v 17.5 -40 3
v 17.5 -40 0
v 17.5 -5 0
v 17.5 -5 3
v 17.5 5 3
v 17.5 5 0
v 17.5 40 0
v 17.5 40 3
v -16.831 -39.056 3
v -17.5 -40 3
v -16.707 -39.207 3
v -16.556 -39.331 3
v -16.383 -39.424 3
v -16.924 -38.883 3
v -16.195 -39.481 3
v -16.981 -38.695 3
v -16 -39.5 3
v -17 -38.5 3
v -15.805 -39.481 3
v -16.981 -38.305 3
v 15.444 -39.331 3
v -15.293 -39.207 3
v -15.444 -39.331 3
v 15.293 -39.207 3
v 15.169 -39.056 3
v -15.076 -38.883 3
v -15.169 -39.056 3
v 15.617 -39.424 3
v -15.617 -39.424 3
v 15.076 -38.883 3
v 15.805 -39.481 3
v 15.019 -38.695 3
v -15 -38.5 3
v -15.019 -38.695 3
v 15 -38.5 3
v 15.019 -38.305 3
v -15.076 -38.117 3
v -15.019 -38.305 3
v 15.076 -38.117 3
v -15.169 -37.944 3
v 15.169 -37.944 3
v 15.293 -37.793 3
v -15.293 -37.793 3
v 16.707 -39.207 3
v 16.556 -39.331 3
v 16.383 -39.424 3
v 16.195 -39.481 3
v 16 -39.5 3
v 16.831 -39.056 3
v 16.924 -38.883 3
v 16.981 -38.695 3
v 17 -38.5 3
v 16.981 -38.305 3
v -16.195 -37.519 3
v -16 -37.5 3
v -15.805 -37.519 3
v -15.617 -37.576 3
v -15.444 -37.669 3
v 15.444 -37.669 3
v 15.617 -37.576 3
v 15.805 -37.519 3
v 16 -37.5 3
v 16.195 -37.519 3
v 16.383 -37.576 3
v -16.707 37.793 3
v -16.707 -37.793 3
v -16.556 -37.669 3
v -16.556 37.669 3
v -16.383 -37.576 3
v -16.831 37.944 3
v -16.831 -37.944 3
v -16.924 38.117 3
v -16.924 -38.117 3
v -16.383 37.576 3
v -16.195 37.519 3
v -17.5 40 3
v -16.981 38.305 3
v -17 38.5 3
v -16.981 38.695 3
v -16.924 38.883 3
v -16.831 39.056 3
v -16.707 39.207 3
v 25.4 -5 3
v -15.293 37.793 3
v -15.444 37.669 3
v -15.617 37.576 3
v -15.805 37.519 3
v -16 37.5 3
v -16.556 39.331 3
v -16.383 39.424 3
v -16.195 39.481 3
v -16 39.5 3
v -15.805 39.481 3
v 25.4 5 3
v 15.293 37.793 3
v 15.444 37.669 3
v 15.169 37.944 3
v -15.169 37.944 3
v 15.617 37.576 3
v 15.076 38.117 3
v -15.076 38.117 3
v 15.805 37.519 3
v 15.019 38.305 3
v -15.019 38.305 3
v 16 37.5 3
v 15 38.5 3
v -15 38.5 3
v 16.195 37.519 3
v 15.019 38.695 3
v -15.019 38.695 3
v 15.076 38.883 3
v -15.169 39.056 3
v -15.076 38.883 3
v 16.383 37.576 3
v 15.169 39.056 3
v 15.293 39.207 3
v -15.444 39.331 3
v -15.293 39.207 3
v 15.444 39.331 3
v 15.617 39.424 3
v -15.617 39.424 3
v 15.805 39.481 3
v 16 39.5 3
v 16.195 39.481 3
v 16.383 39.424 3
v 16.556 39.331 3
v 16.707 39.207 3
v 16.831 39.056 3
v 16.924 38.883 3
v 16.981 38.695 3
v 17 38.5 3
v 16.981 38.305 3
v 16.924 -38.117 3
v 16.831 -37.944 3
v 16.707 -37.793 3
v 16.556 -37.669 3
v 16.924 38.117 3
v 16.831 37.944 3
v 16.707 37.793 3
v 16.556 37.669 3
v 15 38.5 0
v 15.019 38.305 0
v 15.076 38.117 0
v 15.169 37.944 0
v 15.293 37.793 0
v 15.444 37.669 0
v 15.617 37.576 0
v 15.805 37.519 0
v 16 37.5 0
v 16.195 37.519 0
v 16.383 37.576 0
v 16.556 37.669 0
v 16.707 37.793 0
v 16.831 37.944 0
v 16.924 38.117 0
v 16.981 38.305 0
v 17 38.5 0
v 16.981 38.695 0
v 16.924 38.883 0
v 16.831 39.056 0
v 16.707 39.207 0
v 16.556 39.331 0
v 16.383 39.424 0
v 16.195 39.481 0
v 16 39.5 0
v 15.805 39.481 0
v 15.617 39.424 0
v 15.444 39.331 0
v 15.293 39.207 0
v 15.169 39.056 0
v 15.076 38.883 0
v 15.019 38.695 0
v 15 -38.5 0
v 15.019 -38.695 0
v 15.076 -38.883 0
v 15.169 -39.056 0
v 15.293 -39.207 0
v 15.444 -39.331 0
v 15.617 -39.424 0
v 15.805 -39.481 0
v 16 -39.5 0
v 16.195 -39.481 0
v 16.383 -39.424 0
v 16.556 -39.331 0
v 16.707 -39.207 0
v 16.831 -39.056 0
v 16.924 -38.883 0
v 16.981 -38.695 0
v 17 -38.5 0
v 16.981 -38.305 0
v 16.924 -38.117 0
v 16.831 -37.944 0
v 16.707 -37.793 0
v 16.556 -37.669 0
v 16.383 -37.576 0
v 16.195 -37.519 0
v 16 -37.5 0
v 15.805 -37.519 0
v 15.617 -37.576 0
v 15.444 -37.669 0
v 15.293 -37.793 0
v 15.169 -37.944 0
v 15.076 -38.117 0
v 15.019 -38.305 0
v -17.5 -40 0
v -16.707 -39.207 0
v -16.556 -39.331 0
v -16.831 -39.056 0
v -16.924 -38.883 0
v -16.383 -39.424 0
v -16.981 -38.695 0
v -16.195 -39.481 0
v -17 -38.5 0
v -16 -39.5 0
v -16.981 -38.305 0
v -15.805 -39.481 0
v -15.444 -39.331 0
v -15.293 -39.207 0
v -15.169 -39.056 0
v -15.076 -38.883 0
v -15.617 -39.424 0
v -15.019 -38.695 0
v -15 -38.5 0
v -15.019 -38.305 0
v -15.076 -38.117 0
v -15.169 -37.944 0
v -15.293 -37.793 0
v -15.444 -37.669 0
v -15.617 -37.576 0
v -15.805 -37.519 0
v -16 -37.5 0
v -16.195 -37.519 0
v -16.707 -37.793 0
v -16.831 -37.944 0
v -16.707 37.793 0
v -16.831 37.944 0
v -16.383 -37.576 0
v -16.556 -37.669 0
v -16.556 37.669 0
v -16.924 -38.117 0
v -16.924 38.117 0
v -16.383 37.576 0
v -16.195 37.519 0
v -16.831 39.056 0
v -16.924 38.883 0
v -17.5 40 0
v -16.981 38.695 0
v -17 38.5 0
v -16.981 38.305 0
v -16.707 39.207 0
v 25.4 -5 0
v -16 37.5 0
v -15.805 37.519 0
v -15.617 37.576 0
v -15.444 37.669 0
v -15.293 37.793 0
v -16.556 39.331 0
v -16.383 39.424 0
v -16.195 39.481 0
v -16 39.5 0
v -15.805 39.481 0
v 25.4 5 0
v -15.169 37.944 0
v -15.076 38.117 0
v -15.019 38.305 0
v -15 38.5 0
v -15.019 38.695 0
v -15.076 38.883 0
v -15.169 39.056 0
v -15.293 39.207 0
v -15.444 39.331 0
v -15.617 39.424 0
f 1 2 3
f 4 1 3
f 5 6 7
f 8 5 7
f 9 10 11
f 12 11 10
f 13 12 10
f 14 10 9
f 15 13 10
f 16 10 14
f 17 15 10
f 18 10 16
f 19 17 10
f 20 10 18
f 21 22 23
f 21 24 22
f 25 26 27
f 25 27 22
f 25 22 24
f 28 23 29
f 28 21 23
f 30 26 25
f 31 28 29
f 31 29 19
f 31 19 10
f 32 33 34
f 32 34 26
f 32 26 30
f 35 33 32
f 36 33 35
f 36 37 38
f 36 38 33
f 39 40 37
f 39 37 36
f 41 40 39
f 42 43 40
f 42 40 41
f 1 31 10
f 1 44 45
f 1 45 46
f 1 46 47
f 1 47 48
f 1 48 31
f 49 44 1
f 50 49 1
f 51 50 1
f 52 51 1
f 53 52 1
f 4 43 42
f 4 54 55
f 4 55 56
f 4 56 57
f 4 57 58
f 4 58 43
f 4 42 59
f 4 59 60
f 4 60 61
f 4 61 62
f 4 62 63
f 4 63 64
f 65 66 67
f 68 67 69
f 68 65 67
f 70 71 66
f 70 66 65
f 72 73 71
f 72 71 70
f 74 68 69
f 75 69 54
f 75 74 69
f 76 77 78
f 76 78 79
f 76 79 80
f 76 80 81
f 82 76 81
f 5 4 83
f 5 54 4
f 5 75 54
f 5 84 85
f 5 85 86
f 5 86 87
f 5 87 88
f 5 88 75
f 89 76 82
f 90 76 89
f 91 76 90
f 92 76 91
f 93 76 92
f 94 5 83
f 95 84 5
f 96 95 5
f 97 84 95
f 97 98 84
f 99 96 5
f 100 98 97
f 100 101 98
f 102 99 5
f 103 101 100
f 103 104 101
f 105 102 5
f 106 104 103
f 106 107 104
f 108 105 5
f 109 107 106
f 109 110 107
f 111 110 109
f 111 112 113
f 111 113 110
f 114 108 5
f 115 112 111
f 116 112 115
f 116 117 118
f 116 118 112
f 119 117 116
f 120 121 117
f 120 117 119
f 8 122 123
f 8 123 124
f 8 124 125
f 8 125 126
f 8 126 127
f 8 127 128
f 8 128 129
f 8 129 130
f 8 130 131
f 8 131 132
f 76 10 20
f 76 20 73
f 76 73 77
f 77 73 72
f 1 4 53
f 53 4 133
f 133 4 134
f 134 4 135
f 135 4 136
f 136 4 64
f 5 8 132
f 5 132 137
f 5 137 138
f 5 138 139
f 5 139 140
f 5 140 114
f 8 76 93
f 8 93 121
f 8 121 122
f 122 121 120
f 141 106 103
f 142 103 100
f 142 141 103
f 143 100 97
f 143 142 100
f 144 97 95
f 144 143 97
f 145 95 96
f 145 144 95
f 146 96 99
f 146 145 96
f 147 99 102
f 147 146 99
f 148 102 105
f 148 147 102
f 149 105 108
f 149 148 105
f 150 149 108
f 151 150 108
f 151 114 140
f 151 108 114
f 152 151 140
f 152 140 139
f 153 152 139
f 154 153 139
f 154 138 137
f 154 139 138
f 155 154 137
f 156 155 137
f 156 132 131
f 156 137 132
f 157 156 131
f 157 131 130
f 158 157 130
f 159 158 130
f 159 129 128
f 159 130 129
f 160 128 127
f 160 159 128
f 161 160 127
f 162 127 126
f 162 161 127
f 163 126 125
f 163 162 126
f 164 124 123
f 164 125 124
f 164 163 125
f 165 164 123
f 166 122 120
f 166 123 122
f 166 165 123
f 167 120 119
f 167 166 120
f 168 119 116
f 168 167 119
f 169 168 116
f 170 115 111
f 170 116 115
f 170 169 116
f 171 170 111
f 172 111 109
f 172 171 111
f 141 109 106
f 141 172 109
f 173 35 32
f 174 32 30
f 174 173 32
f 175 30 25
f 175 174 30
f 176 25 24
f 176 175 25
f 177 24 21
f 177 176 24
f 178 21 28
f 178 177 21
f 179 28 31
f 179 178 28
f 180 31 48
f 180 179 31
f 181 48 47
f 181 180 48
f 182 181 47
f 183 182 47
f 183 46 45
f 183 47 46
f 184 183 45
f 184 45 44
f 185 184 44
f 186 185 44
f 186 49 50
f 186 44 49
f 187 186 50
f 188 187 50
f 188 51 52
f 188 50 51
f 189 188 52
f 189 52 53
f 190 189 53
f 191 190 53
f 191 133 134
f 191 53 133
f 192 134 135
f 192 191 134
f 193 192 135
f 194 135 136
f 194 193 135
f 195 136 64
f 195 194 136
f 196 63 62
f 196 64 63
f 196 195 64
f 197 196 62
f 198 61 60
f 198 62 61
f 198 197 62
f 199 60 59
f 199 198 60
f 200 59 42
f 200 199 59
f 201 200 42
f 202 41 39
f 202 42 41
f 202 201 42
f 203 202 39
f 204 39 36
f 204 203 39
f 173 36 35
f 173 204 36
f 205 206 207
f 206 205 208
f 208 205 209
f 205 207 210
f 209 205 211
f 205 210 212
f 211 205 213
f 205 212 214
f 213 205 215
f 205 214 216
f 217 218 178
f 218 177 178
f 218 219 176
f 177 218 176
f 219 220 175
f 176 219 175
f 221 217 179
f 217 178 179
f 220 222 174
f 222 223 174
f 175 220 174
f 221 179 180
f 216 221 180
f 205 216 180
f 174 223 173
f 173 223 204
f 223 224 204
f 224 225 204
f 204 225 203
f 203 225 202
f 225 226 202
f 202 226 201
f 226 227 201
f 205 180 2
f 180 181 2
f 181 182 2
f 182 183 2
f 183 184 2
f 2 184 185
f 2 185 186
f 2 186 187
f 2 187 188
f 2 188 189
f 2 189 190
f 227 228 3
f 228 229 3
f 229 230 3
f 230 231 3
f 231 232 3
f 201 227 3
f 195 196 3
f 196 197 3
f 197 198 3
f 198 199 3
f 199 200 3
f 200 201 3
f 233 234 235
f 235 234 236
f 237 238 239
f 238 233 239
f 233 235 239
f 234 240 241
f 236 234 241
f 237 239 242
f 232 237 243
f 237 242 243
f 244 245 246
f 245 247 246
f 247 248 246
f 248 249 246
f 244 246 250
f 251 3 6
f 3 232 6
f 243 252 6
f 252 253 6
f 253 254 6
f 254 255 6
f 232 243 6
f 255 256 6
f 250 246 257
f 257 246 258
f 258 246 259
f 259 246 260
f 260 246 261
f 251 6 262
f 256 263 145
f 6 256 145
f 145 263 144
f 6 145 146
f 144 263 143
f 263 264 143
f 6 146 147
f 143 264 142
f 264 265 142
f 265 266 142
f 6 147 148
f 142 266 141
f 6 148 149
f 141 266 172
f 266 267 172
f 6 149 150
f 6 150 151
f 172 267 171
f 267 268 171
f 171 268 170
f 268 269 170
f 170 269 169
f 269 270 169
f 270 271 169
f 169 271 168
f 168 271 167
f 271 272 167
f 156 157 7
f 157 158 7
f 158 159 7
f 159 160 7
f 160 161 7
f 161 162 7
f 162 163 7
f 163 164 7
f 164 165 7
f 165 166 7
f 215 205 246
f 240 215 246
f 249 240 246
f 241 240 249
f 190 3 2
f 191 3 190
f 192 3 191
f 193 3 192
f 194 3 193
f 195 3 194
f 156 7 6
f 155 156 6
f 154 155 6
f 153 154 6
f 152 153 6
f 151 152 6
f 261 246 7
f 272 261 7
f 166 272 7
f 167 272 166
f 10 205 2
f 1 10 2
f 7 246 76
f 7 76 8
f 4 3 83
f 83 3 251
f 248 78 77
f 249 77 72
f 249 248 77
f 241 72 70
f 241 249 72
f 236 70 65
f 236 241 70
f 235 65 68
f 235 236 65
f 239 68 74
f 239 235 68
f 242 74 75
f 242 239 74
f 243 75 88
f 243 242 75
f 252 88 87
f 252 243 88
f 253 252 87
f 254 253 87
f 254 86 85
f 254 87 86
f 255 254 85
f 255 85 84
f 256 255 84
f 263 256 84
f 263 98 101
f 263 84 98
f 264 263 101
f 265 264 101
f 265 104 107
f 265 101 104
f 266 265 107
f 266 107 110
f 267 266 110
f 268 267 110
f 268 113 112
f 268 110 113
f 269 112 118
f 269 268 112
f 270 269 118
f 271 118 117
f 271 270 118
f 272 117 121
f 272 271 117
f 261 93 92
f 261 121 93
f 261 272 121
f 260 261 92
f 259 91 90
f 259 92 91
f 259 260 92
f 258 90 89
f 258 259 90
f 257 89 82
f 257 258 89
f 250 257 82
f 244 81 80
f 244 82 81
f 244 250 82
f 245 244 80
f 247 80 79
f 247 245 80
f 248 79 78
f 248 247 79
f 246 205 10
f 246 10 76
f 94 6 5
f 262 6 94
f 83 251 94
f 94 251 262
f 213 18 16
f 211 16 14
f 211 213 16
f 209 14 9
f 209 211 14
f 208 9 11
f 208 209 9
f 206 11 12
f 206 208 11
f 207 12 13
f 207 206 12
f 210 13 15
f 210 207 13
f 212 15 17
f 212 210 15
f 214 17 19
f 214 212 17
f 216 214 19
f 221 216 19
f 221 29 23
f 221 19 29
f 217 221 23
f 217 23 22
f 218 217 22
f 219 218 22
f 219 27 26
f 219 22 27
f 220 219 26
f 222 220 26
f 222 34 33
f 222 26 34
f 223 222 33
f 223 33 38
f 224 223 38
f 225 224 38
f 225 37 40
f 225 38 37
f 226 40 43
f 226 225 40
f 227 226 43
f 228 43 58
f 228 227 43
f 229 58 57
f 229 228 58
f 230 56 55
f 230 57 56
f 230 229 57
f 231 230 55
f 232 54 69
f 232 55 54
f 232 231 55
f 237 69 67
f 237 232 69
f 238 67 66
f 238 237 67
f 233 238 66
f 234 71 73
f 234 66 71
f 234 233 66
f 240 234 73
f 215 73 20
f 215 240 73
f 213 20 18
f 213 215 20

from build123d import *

# Parameters (mm, degrees)
SKETCH1_W           = 35
SKETCH1_H           = 80
BOSS_EXTRUDE1_DEPTH = 3
SKETCH2_W           = 9.965503069
SKETCH2_H           = 10
BOSS_EXTRUDE2_DEPTH = 3
SKETCH3_R           = 1
CUT_EXTRUDE2_DEPTH  = 20.272


with BuildPart() as part:
    # Sketch1 → Boss-Extrude1 (new body)
    with BuildSketch(Plane.XY):
        Rectangle(SKETCH1_W, SKETCH1_H)
    extrude(amount=BOSS_EXTRUDE1_DEPTH)

    # Sketch2 → Boss-Extrude2 (add)
    with BuildSketch(Plane.XY):
        with Locations((20.417248466, 0)):
            Rectangle(SKETCH2_W, SKETCH2_H)
    extrude(amount=BOSS_EXTRUDE2_DEPTH)

    # Sketch3 → Cut-Extrude2 (cut)
    with BuildSketch(Plane.XY):
        with Locations(Location((16, 38.5, 0), (0, 0, 180))):
            Circle(SKETCH3_R)
        with Locations(Location((-16, 38.5, 0), (0, 0, 180))):
            Circle(SKETCH3_R)
        with Locations(Location((16, -38.5, 0), (0, 0, 180))):
            Circle(SKETCH3_R)
        with Locations(Location((-16, -38.5, 0), (0, 0, 180))):
            Circle(SKETCH3_R)
    extrude(amount=CUT_EXTRUDE2_DEPTH, mode=Mode.SUBTRACT)


solid = part.part
